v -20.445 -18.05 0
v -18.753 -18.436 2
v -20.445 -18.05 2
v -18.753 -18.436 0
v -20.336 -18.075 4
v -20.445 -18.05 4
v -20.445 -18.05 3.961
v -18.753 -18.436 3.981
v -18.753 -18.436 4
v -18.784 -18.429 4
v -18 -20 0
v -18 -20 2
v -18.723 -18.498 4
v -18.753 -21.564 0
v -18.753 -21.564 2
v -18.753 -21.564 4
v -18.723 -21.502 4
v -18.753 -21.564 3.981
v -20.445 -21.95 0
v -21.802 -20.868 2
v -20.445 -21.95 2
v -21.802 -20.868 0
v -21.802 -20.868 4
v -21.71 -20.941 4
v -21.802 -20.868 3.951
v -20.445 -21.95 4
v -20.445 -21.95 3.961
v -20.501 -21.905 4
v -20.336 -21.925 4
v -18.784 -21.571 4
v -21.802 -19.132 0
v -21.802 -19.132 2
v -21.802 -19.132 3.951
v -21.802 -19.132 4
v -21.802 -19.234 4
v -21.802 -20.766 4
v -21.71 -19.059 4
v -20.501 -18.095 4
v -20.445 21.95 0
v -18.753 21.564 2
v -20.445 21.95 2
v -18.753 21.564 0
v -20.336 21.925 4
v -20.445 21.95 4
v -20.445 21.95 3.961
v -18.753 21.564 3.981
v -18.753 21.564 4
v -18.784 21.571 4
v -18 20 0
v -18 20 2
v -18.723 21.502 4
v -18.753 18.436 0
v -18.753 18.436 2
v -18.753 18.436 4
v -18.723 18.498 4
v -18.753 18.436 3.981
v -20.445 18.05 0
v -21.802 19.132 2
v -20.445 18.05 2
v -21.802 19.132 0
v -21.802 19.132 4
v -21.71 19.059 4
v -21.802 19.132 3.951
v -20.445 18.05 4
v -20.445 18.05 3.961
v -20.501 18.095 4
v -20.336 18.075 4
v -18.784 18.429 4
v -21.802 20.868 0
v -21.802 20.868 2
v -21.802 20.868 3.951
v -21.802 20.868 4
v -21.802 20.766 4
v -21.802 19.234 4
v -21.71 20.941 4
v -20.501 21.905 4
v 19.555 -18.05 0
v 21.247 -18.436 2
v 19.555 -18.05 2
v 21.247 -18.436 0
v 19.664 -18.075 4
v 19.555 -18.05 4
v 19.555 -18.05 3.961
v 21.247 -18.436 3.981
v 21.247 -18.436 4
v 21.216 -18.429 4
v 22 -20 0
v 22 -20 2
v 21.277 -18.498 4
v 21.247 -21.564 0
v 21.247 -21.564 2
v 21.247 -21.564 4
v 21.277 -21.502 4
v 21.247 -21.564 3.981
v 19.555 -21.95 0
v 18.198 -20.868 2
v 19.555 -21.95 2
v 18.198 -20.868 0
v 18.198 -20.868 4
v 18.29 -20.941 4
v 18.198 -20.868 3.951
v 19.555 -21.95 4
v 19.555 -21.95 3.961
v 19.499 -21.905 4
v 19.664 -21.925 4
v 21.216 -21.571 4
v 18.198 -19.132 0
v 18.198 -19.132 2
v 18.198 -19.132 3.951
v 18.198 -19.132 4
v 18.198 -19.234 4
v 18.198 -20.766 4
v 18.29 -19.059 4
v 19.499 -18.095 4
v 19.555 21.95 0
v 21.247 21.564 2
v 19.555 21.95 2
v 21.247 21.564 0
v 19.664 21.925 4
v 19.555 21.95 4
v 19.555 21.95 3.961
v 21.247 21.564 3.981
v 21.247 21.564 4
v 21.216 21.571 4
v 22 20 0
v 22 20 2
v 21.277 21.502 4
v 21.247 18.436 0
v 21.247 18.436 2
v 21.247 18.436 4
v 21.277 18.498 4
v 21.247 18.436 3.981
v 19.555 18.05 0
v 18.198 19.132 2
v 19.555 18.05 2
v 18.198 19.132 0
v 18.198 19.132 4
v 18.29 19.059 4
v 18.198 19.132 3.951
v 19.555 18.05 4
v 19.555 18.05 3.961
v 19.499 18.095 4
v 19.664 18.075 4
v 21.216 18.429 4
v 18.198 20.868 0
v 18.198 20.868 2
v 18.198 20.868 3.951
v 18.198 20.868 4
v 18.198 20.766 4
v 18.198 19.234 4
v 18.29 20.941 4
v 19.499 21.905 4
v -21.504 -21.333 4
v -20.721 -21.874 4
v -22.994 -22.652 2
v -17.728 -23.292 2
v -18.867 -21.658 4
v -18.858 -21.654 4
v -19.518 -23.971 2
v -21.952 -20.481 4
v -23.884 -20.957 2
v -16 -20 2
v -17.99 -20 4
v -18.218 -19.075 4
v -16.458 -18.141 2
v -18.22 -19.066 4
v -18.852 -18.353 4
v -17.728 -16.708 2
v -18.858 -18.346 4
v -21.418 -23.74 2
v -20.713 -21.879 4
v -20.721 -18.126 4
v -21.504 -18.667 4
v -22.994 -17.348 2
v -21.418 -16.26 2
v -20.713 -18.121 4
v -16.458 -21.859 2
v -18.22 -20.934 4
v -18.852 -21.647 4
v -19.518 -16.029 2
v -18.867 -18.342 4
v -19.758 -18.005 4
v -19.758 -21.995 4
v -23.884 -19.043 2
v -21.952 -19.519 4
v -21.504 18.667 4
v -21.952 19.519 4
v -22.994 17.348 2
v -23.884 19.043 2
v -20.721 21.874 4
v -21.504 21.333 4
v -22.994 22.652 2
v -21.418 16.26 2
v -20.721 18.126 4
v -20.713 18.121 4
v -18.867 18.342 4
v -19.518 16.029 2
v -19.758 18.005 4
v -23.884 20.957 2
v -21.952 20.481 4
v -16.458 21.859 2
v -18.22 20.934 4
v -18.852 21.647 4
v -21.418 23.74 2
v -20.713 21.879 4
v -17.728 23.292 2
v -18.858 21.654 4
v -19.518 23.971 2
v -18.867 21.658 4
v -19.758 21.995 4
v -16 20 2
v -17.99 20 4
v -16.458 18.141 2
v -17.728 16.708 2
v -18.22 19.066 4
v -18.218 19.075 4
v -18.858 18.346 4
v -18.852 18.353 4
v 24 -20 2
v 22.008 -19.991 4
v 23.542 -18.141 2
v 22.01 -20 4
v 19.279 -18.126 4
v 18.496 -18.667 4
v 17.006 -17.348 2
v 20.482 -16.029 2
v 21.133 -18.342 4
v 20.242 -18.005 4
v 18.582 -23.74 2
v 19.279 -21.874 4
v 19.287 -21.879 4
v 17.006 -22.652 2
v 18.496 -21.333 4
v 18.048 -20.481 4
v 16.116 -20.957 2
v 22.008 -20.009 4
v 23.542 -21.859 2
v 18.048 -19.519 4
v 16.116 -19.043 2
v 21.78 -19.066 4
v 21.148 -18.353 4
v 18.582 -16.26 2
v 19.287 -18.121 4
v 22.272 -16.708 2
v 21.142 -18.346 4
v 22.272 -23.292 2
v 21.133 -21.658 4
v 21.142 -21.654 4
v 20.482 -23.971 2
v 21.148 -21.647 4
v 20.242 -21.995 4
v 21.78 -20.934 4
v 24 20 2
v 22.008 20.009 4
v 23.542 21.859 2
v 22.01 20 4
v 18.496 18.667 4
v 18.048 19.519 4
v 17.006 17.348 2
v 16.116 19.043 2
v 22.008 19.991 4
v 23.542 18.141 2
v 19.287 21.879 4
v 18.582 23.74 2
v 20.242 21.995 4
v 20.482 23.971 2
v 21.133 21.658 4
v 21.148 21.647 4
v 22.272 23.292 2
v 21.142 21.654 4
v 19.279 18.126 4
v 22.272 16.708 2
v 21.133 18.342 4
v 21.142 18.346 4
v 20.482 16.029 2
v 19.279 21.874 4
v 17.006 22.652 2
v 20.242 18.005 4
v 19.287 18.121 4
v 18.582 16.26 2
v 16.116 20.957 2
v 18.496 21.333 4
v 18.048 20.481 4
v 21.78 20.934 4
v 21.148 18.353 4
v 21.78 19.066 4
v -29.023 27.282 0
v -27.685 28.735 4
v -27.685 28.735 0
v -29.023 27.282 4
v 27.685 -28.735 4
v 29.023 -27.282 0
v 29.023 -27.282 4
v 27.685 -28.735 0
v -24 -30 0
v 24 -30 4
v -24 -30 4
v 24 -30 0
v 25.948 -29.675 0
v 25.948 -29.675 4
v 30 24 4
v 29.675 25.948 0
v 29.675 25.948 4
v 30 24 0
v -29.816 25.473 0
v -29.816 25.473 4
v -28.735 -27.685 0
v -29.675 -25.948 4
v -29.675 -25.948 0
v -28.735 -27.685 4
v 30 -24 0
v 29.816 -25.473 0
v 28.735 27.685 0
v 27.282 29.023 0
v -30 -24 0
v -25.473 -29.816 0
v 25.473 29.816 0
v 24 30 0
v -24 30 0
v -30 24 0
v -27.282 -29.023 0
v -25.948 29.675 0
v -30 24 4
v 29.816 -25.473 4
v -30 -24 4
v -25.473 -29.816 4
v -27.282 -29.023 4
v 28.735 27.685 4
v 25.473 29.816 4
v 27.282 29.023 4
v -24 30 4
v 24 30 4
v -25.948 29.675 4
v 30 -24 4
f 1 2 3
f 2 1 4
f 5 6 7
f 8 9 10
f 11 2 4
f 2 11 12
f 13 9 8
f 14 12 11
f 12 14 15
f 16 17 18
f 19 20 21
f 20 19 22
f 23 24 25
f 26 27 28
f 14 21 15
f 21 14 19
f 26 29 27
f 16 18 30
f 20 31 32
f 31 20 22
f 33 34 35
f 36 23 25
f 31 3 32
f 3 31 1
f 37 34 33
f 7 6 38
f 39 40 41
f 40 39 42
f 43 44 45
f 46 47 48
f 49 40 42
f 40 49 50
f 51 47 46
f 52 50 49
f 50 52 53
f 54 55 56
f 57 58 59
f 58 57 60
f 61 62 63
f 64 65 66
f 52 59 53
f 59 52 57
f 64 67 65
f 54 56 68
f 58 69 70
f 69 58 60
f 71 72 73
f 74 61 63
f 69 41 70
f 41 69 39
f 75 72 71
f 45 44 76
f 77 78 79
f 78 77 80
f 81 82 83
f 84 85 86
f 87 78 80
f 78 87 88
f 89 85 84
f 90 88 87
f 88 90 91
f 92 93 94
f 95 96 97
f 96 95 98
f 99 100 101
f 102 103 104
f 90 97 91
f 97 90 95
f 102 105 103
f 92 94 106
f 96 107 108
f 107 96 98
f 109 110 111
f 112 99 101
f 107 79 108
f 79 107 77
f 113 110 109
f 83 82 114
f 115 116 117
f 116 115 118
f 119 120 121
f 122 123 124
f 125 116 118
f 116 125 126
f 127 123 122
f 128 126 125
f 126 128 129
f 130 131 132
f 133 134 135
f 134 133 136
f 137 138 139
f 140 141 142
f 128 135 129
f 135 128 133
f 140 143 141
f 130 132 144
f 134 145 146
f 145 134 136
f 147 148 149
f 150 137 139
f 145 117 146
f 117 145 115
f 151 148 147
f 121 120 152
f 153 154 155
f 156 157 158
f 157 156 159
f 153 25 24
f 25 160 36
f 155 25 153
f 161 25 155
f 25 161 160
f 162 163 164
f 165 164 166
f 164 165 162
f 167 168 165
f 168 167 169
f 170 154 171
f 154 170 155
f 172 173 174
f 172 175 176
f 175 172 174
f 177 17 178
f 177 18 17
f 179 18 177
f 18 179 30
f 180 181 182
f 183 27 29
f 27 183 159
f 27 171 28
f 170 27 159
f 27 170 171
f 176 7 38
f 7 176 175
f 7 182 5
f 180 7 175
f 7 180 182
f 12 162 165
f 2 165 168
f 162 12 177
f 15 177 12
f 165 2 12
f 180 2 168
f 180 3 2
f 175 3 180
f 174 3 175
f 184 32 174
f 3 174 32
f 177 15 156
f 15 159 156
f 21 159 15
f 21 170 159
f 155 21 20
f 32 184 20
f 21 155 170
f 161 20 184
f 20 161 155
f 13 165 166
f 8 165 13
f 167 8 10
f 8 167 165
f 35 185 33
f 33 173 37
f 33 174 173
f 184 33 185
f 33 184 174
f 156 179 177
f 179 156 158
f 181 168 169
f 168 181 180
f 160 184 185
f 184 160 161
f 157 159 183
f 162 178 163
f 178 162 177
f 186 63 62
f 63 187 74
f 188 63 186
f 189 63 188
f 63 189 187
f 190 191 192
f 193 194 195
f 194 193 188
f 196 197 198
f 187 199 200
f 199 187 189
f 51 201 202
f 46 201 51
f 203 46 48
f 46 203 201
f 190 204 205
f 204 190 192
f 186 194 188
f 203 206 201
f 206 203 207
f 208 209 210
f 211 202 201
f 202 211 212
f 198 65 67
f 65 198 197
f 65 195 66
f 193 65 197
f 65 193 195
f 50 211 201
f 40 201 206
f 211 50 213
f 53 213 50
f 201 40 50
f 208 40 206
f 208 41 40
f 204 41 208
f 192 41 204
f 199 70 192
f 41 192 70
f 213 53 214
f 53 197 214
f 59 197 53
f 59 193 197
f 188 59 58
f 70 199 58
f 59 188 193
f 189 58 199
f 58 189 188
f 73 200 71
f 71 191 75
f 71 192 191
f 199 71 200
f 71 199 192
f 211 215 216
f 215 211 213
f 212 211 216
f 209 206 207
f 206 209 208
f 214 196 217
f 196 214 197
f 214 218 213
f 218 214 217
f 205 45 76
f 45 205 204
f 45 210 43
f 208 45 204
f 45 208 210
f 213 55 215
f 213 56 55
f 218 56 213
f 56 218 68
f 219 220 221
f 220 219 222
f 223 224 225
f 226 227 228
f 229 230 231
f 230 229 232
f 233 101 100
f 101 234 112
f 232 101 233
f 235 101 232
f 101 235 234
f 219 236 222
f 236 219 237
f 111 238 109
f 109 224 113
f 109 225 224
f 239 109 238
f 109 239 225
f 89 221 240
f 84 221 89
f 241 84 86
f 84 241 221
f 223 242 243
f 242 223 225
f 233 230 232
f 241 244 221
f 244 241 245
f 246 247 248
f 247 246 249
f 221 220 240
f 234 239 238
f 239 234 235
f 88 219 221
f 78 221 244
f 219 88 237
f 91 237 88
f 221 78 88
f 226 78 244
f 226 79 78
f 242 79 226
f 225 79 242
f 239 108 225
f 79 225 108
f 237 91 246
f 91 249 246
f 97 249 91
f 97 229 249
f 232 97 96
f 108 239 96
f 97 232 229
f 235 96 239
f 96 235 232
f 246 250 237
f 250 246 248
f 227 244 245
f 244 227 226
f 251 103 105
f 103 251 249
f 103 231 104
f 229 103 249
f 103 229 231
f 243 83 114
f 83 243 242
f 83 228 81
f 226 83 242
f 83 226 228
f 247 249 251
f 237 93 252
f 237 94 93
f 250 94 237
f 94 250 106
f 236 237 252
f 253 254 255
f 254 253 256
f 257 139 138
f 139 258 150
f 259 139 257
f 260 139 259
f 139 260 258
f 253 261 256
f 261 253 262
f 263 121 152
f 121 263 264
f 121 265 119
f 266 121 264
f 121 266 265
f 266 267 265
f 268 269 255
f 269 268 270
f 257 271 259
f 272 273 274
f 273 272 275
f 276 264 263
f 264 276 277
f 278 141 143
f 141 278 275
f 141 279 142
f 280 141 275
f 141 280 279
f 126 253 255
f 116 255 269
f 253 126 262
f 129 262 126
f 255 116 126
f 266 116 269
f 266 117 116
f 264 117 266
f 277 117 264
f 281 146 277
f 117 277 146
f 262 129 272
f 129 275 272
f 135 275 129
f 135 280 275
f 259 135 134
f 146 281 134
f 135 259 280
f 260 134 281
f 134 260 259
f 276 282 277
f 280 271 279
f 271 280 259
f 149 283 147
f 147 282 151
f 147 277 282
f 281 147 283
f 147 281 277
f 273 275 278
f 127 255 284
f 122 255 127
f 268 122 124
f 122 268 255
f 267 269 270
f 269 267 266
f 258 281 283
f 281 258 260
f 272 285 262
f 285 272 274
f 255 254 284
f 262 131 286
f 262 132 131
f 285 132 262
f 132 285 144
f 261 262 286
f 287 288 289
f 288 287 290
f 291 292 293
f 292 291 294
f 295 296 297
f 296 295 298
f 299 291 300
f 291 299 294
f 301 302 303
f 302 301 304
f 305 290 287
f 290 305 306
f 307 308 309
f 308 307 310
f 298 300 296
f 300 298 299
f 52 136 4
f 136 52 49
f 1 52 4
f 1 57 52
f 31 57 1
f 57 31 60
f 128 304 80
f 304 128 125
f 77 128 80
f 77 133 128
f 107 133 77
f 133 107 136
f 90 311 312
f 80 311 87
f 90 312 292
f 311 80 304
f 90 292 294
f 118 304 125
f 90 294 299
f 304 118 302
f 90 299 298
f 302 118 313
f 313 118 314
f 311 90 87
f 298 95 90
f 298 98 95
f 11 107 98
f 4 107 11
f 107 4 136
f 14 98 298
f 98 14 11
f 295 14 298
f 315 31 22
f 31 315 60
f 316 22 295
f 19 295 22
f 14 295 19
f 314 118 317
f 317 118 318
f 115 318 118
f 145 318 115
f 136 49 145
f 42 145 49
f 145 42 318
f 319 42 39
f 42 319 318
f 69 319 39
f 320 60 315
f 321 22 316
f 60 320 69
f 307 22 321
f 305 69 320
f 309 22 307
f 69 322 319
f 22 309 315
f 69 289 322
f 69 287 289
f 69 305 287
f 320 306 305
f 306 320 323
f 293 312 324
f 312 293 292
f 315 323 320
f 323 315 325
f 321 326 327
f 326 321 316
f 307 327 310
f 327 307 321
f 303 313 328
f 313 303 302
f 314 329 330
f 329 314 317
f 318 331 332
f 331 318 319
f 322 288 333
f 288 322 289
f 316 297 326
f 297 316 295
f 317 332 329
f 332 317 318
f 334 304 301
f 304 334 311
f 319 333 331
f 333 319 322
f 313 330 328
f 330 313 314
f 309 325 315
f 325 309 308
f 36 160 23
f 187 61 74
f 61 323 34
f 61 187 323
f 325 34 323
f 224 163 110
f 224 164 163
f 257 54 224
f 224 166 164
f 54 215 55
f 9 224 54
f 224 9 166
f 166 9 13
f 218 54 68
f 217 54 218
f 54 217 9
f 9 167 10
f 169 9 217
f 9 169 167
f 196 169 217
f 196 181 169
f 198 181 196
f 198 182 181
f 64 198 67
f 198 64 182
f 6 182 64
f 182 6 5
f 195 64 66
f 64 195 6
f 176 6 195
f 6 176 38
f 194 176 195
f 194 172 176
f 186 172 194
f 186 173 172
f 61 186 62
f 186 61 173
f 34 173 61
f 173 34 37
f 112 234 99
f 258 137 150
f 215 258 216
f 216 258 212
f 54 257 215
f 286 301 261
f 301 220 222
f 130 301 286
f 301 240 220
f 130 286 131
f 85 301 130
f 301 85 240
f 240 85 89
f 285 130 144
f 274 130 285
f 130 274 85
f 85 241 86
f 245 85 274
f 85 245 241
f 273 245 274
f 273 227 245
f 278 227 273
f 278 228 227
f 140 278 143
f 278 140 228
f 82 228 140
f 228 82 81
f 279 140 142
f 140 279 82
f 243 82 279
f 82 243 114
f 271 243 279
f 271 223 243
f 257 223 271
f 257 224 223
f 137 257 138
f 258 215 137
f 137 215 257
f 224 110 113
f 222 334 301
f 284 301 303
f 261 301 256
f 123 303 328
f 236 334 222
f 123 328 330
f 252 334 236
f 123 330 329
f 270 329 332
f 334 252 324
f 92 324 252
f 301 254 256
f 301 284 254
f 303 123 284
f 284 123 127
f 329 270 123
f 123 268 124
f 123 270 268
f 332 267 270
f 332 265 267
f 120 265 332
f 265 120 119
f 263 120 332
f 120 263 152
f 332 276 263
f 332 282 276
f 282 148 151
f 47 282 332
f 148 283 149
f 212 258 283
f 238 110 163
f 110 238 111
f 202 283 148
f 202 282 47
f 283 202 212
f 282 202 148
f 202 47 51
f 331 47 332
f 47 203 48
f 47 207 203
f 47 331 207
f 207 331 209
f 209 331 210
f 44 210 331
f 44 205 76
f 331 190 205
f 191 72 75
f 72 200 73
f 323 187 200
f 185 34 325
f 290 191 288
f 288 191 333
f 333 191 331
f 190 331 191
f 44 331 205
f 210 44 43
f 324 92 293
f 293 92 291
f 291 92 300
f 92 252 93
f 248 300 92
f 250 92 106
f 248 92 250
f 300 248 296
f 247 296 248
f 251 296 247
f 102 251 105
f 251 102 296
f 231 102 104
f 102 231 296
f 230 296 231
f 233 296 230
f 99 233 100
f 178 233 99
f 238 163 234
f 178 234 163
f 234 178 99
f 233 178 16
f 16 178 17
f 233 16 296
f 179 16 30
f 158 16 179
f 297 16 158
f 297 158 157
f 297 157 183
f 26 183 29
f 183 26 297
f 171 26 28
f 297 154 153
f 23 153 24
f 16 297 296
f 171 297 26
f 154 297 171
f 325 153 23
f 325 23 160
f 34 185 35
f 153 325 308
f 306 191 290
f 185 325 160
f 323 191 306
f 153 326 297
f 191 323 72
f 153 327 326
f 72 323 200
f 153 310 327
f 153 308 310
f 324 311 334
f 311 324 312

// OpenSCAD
// orcad: flat wall plate with a grid of screw holes, rounded corners and optional countersinks.
plate_width = 60;
plate_height = 60;
plate_thickness = 4;
columns = 2;
rows = 2;
hole_spacing_x = 40;
hole_spacing_y = 40;
hole_diameter = 4;
countersink = true;
corner_radius = 6;
sink_diameter = 8;

col_n = max(columns, 1);
row_n = max(rows, 1);
sink_d = max(sink_diameter, hole_diameter + 1);
half_x = (plate_width - sink_d) / 2 - corner_radius;
half_y = (plate_height - sink_d) / 2 - corner_radius;
spacing_x = min(hole_spacing_x, max(2 * half_x, 0));
spacing_y = min(hole_spacing_y, max(2 * half_y, 0));
sink_depth = min((sink_d - hole_diameter) / 2, plate_thickness * 0.8);
r = min(corner_radius, plate_width / 2 - 0.01, plate_height / 2 - 0.01);

difference() {
    if (r > 0)
        linear_extrude(height = plate_thickness)
            offset(r = r) square([plate_width - 2 * r, plate_height - 2 * r], center = true);
    else
        cube([plate_width, plate_height, plate_thickness], center = true);

    for (i = [0 : col_n - 1], j = [0 : row_n - 1])
        translate([(i - (col_n - 1) / 2) * spacing_x, (j - (row_n - 1) / 2) * spacing_y, -0.01])
            cylinder(d = hole_diameter, h = plate_thickness + 0.02);

    if (countersink)
        for (i = [0 : col_n - 1], j = [0 : row_n - 1])
            translate([(i - (col_n - 1) / 2) * spacing_x, (j - (row_n - 1) / 2) * spacing_y,
                       plate_thickness - sink_depth])
                cylinder(d1 = sink_d, d2 = hole_diameter, h = sink_depth + 0.01);
}
